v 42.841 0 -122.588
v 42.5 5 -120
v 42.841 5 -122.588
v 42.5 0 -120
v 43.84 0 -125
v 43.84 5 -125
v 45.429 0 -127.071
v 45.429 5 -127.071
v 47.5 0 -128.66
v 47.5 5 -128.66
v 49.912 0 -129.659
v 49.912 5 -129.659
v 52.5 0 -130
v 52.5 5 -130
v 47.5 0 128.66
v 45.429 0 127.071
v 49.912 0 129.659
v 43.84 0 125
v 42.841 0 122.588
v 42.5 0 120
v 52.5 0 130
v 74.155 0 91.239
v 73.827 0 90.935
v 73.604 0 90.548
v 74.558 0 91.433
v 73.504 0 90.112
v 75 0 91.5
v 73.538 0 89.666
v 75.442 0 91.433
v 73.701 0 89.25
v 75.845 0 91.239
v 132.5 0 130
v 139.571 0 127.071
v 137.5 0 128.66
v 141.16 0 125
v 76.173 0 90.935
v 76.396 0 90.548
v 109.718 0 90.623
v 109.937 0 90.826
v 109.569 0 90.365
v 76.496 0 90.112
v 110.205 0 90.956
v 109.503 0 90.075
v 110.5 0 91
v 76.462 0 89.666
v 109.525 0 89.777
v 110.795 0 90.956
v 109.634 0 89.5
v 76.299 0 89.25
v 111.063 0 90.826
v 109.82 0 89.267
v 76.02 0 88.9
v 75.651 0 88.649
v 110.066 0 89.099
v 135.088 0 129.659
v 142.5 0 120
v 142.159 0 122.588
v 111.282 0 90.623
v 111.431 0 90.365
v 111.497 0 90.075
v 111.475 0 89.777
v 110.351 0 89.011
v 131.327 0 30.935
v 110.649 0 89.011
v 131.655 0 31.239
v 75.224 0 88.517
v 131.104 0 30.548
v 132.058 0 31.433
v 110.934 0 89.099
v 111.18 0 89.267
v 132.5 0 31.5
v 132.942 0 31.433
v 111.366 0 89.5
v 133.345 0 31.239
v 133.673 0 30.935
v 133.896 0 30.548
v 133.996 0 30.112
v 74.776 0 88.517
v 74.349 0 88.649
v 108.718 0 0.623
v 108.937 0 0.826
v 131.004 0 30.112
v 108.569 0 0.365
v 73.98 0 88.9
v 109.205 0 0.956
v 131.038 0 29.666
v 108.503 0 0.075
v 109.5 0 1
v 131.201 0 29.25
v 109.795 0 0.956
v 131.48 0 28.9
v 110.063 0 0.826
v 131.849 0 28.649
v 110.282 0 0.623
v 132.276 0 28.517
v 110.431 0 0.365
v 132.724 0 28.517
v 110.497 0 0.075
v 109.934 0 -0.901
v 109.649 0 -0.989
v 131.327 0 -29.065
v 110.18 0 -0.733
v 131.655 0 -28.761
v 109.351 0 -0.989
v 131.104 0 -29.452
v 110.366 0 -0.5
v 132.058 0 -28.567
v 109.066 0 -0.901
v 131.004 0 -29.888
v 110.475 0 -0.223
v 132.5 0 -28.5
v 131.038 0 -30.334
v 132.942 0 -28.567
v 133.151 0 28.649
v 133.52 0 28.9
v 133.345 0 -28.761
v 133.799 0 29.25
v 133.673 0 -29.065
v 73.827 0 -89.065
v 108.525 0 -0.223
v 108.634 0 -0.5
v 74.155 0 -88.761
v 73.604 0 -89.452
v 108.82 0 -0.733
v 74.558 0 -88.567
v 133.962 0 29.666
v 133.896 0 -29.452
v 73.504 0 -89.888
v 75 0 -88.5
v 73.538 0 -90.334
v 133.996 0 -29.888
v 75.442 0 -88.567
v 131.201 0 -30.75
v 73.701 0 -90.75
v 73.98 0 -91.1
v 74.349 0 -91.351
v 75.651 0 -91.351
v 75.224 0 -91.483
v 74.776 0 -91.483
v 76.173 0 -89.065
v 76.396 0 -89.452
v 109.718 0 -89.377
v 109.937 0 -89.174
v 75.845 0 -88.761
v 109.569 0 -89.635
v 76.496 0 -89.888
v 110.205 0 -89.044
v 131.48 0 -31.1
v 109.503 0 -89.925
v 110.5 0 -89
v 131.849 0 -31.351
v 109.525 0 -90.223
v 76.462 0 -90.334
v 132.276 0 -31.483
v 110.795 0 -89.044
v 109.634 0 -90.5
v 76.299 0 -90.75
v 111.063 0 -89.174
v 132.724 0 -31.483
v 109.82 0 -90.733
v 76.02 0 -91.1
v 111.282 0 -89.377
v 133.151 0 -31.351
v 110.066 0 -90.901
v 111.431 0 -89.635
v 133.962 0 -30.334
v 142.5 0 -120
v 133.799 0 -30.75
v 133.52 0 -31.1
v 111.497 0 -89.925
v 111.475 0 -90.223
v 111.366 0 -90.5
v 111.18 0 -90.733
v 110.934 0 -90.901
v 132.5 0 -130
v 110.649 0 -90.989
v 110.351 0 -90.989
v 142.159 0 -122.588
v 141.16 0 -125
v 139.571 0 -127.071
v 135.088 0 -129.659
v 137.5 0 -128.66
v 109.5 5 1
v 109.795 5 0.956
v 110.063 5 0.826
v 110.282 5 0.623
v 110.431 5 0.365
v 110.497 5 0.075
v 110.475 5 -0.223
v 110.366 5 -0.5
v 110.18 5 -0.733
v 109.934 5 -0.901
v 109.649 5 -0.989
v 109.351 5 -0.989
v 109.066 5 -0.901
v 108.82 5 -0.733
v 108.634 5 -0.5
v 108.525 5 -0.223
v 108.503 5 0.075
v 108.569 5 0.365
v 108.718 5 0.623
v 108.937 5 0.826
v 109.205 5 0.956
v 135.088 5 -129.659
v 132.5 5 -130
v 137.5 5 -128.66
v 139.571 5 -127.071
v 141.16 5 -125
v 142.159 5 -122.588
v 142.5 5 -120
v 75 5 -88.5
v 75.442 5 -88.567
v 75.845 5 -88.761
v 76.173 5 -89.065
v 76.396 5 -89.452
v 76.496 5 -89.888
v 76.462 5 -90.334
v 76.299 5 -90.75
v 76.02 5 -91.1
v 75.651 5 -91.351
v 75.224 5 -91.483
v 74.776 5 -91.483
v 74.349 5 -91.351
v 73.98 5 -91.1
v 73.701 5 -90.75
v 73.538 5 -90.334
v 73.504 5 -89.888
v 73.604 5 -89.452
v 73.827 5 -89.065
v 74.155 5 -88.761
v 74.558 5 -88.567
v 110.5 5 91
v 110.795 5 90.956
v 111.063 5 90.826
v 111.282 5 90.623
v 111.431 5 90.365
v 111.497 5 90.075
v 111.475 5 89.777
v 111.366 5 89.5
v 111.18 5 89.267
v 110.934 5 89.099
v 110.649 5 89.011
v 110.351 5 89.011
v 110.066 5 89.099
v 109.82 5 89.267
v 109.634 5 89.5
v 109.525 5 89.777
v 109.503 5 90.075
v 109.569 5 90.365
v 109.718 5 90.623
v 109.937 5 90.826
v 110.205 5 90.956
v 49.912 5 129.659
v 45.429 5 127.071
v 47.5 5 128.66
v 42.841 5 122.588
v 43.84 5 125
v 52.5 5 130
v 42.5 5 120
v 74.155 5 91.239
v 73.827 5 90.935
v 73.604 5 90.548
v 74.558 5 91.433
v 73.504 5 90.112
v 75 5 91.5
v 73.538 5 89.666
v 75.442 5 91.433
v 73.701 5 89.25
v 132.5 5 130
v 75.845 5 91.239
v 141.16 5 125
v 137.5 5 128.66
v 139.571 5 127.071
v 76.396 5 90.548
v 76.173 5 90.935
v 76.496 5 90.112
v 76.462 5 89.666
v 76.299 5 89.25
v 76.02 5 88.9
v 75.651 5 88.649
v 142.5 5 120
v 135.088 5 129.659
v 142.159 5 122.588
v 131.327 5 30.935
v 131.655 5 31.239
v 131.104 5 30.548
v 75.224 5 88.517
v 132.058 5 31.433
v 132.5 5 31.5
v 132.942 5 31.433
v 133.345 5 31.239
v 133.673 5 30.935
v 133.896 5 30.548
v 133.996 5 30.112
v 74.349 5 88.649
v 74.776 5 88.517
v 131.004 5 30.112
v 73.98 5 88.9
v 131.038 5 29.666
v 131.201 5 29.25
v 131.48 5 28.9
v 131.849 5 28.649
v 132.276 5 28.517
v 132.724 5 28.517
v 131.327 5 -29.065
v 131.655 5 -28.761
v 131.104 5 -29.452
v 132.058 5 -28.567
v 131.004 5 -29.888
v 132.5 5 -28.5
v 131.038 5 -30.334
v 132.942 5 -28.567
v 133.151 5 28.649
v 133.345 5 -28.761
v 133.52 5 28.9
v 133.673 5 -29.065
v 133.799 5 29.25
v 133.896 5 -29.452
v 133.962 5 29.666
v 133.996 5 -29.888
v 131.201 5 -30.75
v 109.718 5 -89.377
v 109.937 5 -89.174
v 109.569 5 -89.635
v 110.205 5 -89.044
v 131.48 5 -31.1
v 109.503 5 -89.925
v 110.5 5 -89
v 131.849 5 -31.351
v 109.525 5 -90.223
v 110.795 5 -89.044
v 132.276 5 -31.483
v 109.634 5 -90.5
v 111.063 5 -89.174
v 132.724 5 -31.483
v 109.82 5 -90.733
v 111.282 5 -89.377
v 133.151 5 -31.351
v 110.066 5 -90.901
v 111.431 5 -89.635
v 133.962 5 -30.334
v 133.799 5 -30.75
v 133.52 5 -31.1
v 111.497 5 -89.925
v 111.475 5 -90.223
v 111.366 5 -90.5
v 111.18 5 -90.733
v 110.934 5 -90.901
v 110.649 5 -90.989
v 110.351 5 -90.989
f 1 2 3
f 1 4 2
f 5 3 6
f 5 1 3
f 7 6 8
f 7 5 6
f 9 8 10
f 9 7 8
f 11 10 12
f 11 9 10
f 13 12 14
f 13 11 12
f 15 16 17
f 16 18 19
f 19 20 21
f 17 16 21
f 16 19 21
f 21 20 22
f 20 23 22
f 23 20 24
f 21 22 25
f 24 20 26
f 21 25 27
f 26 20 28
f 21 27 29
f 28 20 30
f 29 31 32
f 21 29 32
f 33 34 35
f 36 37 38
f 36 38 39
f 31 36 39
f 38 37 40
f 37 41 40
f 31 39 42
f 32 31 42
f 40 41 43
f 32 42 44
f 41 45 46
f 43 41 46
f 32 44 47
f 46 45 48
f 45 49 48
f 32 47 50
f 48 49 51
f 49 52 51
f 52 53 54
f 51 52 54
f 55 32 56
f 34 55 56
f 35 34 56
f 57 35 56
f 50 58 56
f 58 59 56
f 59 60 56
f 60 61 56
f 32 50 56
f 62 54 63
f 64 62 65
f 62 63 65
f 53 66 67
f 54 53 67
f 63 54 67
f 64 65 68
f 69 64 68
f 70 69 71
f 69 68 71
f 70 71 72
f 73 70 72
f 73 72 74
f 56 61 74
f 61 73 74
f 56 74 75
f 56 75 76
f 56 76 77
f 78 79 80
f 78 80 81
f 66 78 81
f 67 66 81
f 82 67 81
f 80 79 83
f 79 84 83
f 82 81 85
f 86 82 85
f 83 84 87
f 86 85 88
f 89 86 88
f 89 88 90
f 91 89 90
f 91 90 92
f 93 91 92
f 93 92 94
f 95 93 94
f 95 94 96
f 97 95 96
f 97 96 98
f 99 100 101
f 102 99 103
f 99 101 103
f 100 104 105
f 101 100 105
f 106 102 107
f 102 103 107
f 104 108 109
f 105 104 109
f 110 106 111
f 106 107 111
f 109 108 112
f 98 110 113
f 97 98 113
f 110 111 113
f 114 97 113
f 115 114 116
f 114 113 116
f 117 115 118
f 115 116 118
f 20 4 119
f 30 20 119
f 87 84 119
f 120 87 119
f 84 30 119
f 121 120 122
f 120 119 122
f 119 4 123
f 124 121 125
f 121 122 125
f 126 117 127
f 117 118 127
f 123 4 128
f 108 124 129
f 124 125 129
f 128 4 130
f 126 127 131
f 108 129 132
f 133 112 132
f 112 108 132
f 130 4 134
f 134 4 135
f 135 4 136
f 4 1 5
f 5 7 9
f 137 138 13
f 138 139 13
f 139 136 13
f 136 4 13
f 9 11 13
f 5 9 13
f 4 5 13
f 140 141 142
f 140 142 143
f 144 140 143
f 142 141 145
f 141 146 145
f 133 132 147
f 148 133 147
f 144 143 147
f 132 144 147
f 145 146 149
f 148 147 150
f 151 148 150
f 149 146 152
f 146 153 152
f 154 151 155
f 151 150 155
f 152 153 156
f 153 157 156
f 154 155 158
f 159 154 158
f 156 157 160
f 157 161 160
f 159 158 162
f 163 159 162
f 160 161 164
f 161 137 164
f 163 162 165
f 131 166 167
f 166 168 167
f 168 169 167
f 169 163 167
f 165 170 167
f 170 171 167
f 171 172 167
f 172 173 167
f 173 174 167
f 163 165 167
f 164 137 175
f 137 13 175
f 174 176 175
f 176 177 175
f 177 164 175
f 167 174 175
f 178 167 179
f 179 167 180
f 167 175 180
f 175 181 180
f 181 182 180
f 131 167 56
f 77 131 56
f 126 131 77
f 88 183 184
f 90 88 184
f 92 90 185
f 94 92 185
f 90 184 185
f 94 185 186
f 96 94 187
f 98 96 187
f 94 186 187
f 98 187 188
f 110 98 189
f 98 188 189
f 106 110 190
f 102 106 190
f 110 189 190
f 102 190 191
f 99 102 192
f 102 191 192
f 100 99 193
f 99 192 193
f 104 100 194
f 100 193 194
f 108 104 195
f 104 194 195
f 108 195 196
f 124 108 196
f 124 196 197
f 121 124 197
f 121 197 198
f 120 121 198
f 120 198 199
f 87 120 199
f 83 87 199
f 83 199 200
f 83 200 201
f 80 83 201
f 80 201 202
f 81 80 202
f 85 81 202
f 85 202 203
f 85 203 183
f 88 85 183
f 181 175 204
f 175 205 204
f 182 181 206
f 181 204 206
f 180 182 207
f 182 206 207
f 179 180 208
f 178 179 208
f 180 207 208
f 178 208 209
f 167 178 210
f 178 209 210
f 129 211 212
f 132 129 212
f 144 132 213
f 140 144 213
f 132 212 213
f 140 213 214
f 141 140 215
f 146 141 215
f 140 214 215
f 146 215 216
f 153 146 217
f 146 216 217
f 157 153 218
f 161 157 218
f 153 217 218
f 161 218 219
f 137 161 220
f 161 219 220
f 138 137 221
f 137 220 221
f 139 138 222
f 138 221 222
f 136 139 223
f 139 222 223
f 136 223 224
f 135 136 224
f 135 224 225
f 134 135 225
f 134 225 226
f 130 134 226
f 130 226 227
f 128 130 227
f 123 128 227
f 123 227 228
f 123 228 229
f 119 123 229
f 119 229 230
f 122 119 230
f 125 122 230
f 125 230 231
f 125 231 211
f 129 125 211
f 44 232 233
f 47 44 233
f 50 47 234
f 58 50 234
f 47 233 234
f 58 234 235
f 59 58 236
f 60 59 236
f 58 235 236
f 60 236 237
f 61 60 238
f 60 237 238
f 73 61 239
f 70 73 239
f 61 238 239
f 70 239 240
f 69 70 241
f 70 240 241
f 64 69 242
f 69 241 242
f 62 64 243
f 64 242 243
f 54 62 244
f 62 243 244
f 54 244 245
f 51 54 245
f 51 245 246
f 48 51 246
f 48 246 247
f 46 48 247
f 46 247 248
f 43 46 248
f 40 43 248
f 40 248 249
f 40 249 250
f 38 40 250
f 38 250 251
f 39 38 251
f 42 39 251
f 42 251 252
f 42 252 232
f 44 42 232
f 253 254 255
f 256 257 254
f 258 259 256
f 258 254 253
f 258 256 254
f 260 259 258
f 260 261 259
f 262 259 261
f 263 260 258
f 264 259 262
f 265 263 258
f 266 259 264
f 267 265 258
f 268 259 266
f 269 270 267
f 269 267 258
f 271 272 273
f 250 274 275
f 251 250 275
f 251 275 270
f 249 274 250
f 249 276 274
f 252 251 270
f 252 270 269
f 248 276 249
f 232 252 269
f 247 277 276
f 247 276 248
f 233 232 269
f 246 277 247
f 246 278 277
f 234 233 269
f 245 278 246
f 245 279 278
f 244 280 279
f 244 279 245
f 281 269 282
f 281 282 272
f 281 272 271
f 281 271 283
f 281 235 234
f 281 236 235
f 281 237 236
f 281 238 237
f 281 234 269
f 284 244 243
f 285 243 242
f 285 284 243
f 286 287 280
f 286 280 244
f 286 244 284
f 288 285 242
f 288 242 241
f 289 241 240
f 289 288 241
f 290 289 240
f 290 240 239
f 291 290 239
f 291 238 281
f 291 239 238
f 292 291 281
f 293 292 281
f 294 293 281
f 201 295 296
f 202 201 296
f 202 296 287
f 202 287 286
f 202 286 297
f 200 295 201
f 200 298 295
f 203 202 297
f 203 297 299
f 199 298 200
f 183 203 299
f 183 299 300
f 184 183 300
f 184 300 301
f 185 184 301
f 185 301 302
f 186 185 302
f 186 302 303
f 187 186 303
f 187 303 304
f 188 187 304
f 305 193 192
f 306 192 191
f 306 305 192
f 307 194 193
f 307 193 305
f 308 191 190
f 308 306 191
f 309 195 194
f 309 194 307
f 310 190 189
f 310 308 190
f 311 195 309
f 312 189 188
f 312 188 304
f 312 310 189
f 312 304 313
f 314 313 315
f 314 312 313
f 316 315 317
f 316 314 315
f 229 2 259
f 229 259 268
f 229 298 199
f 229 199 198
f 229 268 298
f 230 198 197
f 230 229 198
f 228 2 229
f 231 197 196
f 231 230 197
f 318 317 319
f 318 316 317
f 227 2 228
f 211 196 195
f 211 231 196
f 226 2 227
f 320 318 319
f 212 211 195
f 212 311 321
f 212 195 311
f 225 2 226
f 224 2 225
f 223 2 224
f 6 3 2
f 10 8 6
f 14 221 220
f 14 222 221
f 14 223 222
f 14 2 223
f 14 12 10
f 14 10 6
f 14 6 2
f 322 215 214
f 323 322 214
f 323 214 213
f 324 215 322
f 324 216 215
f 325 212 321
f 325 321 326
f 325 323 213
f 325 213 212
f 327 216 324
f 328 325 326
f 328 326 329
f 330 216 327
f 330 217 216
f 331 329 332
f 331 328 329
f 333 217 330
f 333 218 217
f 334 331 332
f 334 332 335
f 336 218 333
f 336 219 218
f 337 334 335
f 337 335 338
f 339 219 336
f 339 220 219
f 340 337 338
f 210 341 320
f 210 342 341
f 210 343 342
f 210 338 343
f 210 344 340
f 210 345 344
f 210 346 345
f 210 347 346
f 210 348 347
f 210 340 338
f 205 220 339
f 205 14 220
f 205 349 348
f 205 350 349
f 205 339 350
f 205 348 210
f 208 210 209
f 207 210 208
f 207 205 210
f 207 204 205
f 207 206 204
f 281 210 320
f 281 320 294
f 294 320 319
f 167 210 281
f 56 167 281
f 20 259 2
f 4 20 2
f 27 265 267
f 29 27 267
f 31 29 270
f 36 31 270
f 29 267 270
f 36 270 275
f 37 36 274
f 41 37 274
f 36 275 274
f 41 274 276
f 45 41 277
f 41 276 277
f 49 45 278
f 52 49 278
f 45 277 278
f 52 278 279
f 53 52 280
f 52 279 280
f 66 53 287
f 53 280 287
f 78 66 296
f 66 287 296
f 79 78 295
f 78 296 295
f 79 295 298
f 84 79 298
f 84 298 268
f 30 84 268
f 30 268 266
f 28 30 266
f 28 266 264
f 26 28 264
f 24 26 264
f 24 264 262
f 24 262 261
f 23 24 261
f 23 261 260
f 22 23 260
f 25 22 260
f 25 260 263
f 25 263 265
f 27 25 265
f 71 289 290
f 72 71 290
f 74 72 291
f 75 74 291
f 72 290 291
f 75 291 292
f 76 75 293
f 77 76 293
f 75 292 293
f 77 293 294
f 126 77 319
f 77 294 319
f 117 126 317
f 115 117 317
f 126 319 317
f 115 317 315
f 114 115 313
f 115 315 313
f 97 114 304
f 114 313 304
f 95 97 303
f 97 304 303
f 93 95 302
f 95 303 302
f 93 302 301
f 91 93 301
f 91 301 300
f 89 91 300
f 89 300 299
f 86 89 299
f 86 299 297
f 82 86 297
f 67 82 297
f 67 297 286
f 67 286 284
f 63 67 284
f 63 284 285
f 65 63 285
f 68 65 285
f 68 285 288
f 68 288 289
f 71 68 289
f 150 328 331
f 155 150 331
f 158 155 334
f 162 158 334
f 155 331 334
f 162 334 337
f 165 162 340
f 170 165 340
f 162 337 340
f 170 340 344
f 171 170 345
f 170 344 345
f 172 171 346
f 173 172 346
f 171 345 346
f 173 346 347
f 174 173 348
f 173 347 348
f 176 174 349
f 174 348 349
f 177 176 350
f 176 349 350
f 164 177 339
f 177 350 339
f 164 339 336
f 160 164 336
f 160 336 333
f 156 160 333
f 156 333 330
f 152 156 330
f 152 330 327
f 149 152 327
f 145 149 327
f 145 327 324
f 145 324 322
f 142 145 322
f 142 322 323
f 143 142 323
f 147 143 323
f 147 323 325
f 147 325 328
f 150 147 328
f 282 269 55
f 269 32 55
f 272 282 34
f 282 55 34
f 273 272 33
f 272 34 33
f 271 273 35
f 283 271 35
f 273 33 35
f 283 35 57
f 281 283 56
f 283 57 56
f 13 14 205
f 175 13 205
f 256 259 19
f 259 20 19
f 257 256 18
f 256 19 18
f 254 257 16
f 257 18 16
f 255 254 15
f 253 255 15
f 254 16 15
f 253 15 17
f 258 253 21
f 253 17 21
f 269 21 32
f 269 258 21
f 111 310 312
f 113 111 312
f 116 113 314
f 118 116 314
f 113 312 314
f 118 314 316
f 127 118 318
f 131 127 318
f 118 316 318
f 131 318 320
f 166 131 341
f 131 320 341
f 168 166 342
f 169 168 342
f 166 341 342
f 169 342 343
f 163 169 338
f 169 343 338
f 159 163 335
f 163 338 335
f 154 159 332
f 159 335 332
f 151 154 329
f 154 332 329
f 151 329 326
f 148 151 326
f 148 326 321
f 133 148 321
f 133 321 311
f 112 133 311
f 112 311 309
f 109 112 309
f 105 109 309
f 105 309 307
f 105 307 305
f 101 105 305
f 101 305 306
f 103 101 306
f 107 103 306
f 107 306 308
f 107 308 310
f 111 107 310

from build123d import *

# Parameters (mm, degrees)
SKETCH_1_W          = 300
SKETCH_1_H          = 200
EXTRUDE_1_DEPTH     = 5
EXTRUDE_2_DEPTH     = 5
SKETCH_6_W          = 200
SKETCH_6_H          = 200
CUT_EXTRUDE_4_DEPTH = 35
CUT_EXTRUDE_5_DEPTH = 50
SKETCH_8_W          = 100
SKETCH_8_H          = 260
EXTRUDE_3_DEPTH     = 5
SKETCH_9_R          = 1.5
CUT_EXTRUDE_6_DEPTH = 15
SKETCH_10_R         = 1.5
CUT_EXTRUDE_7_DEPTH = 15
SKETCH_11_R         = 1
CUT_EXTRUDE_8_DEPTH = 10
FILLET_5_R          = 10


with BuildPart() as part:
    # 草图1 → 凸台-拉伸1 (new body)
    with BuildSketch(Plane(origin=(0, 0, 0), x_dir=(1, 0, 0), z_dir=(0, 1, 0))):
        Rectangle(SKETCH_1_W, SKETCH_1_H)
    extrude(amount=EXTRUDE_1_DEPTH)

    # 草图5 → 凸台-拉伸2 (add)
    with BuildSketch(Plane(origin=(0, 5, 0), x_dir=(1, 0, 0), z_dir=(0, 1, 0))):
        Polygon((50, 100), (50, -100), (50, -130), (150, -130), (150, -100), (150, 100), (150, 130), (50, 130), align=None)
    extrude(amount=-EXTRUDE_2_DEPTH)

    # 草图6 → 切除-拉伸4 (cut)
    with BuildSketch(Plane(origin=(0, 5, 0), x_dir=(1, 0, 0), z_dir=(0, 1, 0))):
        with Locations((-50, 0)):
            Rectangle(SKETCH_6_W, SKETCH_6_H)
    extrude(amount=-CUT_EXTRUDE_4_DEPTH, mode=Mode.SUBTRACT)

    # 草图7 → 切除-拉伸5 (cut)
    with BuildSketch(Plane(origin=(0, 5, 0), x_dir=(1, 0, 0), z_dir=(0, 1, 0))):
        Polygon((142.5, -64.847184809), (142.5, -158.601088014), (197.194556245, -158.601088014), (197.194556245, 177.556552237), (142.5, 177.556552237), align=None)
    extrude(amount=-CUT_EXTRUDE_5_DEPTH, mode=Mode.SUBTRACT)

    # 草图8 → 凸台-拉伸3 (add)
    with BuildSketch(Plane(origin=(0, 5, 0), x_dir=(1, 0, 0), z_dir=(0, 1, 0))):
        with Locations((92.5, 0)):
            Rectangle(SKETCH_8_W, SKETCH_8_H)
    extrude(amount=-EXTRUDE_3_DEPTH)

    # 草图9 → 切除-拉伸6 (cut)
    with BuildSketch(Plane(origin=(0, 5, 0), x_dir=(1, 0, 0), z_dir=(0, 1, 0))):
        with Locations(Location((132.5, 30, 0), (0, 0, 270))):
            Circle(SKETCH_9_R)
        with Locations(Location((132.5, -30, 0), (0, 0, 270))):
            Circle(SKETCH_9_R)
    extrude(amount=-CUT_EXTRUDE_6_DEPTH, mode=Mode.SUBTRACT)

    # 草图10 → 切除-拉伸7 (cut)
    with BuildSketch(Plane(origin=(0, 5, 0), x_dir=(1, 0, 0), z_dir=(0, 1, 0))):
        with Locations(Location((75, 90, 0), (0, 0, 270))):
            Circle(SKETCH_10_R)
        with Locations(Location((75, -90, 0), (0, 0, 270))):
            Circle(SKETCH_10_R)
    extrude(amount=-CUT_EXTRUDE_7_DEPTH, mode=Mode.SUBTRACT)

    # 草图11 → 切除-拉伸8 (cut)
    with BuildSketch(Plane(origin=(0, 5, 0), x_dir=(1, 0, 0), z_dir=(0, 1, 0))):
        with Locations(Location((110.5, 90, 0), (0, 0, 270))):
            Circle(SKETCH_11_R)
        with Locations(Location((109.5, 0, 0), (0, 0, 270))):
            Circle(SKETCH_11_R)
        with Locations(Location((110.5, -90, 0), (0, 0, 270))):
            Circle(SKETCH_11_R)
    extrude(amount=-CUT_EXTRUDE_8_DEPTH, mode=Mode.SUBTRACT)

    # 圆角5
    fillet_5_edges = [part.edges().sort_by_distance(p)[0] for p in [
        (142.5, 2.5, -130),
        (142.5, 2.5, 130),
        (42.5, 2.5, 130),
        (42.5, 2.5, -130),
    ]]
    fillet(fillet_5_edges, radius=FILLET_5_R)


solid = part.part
